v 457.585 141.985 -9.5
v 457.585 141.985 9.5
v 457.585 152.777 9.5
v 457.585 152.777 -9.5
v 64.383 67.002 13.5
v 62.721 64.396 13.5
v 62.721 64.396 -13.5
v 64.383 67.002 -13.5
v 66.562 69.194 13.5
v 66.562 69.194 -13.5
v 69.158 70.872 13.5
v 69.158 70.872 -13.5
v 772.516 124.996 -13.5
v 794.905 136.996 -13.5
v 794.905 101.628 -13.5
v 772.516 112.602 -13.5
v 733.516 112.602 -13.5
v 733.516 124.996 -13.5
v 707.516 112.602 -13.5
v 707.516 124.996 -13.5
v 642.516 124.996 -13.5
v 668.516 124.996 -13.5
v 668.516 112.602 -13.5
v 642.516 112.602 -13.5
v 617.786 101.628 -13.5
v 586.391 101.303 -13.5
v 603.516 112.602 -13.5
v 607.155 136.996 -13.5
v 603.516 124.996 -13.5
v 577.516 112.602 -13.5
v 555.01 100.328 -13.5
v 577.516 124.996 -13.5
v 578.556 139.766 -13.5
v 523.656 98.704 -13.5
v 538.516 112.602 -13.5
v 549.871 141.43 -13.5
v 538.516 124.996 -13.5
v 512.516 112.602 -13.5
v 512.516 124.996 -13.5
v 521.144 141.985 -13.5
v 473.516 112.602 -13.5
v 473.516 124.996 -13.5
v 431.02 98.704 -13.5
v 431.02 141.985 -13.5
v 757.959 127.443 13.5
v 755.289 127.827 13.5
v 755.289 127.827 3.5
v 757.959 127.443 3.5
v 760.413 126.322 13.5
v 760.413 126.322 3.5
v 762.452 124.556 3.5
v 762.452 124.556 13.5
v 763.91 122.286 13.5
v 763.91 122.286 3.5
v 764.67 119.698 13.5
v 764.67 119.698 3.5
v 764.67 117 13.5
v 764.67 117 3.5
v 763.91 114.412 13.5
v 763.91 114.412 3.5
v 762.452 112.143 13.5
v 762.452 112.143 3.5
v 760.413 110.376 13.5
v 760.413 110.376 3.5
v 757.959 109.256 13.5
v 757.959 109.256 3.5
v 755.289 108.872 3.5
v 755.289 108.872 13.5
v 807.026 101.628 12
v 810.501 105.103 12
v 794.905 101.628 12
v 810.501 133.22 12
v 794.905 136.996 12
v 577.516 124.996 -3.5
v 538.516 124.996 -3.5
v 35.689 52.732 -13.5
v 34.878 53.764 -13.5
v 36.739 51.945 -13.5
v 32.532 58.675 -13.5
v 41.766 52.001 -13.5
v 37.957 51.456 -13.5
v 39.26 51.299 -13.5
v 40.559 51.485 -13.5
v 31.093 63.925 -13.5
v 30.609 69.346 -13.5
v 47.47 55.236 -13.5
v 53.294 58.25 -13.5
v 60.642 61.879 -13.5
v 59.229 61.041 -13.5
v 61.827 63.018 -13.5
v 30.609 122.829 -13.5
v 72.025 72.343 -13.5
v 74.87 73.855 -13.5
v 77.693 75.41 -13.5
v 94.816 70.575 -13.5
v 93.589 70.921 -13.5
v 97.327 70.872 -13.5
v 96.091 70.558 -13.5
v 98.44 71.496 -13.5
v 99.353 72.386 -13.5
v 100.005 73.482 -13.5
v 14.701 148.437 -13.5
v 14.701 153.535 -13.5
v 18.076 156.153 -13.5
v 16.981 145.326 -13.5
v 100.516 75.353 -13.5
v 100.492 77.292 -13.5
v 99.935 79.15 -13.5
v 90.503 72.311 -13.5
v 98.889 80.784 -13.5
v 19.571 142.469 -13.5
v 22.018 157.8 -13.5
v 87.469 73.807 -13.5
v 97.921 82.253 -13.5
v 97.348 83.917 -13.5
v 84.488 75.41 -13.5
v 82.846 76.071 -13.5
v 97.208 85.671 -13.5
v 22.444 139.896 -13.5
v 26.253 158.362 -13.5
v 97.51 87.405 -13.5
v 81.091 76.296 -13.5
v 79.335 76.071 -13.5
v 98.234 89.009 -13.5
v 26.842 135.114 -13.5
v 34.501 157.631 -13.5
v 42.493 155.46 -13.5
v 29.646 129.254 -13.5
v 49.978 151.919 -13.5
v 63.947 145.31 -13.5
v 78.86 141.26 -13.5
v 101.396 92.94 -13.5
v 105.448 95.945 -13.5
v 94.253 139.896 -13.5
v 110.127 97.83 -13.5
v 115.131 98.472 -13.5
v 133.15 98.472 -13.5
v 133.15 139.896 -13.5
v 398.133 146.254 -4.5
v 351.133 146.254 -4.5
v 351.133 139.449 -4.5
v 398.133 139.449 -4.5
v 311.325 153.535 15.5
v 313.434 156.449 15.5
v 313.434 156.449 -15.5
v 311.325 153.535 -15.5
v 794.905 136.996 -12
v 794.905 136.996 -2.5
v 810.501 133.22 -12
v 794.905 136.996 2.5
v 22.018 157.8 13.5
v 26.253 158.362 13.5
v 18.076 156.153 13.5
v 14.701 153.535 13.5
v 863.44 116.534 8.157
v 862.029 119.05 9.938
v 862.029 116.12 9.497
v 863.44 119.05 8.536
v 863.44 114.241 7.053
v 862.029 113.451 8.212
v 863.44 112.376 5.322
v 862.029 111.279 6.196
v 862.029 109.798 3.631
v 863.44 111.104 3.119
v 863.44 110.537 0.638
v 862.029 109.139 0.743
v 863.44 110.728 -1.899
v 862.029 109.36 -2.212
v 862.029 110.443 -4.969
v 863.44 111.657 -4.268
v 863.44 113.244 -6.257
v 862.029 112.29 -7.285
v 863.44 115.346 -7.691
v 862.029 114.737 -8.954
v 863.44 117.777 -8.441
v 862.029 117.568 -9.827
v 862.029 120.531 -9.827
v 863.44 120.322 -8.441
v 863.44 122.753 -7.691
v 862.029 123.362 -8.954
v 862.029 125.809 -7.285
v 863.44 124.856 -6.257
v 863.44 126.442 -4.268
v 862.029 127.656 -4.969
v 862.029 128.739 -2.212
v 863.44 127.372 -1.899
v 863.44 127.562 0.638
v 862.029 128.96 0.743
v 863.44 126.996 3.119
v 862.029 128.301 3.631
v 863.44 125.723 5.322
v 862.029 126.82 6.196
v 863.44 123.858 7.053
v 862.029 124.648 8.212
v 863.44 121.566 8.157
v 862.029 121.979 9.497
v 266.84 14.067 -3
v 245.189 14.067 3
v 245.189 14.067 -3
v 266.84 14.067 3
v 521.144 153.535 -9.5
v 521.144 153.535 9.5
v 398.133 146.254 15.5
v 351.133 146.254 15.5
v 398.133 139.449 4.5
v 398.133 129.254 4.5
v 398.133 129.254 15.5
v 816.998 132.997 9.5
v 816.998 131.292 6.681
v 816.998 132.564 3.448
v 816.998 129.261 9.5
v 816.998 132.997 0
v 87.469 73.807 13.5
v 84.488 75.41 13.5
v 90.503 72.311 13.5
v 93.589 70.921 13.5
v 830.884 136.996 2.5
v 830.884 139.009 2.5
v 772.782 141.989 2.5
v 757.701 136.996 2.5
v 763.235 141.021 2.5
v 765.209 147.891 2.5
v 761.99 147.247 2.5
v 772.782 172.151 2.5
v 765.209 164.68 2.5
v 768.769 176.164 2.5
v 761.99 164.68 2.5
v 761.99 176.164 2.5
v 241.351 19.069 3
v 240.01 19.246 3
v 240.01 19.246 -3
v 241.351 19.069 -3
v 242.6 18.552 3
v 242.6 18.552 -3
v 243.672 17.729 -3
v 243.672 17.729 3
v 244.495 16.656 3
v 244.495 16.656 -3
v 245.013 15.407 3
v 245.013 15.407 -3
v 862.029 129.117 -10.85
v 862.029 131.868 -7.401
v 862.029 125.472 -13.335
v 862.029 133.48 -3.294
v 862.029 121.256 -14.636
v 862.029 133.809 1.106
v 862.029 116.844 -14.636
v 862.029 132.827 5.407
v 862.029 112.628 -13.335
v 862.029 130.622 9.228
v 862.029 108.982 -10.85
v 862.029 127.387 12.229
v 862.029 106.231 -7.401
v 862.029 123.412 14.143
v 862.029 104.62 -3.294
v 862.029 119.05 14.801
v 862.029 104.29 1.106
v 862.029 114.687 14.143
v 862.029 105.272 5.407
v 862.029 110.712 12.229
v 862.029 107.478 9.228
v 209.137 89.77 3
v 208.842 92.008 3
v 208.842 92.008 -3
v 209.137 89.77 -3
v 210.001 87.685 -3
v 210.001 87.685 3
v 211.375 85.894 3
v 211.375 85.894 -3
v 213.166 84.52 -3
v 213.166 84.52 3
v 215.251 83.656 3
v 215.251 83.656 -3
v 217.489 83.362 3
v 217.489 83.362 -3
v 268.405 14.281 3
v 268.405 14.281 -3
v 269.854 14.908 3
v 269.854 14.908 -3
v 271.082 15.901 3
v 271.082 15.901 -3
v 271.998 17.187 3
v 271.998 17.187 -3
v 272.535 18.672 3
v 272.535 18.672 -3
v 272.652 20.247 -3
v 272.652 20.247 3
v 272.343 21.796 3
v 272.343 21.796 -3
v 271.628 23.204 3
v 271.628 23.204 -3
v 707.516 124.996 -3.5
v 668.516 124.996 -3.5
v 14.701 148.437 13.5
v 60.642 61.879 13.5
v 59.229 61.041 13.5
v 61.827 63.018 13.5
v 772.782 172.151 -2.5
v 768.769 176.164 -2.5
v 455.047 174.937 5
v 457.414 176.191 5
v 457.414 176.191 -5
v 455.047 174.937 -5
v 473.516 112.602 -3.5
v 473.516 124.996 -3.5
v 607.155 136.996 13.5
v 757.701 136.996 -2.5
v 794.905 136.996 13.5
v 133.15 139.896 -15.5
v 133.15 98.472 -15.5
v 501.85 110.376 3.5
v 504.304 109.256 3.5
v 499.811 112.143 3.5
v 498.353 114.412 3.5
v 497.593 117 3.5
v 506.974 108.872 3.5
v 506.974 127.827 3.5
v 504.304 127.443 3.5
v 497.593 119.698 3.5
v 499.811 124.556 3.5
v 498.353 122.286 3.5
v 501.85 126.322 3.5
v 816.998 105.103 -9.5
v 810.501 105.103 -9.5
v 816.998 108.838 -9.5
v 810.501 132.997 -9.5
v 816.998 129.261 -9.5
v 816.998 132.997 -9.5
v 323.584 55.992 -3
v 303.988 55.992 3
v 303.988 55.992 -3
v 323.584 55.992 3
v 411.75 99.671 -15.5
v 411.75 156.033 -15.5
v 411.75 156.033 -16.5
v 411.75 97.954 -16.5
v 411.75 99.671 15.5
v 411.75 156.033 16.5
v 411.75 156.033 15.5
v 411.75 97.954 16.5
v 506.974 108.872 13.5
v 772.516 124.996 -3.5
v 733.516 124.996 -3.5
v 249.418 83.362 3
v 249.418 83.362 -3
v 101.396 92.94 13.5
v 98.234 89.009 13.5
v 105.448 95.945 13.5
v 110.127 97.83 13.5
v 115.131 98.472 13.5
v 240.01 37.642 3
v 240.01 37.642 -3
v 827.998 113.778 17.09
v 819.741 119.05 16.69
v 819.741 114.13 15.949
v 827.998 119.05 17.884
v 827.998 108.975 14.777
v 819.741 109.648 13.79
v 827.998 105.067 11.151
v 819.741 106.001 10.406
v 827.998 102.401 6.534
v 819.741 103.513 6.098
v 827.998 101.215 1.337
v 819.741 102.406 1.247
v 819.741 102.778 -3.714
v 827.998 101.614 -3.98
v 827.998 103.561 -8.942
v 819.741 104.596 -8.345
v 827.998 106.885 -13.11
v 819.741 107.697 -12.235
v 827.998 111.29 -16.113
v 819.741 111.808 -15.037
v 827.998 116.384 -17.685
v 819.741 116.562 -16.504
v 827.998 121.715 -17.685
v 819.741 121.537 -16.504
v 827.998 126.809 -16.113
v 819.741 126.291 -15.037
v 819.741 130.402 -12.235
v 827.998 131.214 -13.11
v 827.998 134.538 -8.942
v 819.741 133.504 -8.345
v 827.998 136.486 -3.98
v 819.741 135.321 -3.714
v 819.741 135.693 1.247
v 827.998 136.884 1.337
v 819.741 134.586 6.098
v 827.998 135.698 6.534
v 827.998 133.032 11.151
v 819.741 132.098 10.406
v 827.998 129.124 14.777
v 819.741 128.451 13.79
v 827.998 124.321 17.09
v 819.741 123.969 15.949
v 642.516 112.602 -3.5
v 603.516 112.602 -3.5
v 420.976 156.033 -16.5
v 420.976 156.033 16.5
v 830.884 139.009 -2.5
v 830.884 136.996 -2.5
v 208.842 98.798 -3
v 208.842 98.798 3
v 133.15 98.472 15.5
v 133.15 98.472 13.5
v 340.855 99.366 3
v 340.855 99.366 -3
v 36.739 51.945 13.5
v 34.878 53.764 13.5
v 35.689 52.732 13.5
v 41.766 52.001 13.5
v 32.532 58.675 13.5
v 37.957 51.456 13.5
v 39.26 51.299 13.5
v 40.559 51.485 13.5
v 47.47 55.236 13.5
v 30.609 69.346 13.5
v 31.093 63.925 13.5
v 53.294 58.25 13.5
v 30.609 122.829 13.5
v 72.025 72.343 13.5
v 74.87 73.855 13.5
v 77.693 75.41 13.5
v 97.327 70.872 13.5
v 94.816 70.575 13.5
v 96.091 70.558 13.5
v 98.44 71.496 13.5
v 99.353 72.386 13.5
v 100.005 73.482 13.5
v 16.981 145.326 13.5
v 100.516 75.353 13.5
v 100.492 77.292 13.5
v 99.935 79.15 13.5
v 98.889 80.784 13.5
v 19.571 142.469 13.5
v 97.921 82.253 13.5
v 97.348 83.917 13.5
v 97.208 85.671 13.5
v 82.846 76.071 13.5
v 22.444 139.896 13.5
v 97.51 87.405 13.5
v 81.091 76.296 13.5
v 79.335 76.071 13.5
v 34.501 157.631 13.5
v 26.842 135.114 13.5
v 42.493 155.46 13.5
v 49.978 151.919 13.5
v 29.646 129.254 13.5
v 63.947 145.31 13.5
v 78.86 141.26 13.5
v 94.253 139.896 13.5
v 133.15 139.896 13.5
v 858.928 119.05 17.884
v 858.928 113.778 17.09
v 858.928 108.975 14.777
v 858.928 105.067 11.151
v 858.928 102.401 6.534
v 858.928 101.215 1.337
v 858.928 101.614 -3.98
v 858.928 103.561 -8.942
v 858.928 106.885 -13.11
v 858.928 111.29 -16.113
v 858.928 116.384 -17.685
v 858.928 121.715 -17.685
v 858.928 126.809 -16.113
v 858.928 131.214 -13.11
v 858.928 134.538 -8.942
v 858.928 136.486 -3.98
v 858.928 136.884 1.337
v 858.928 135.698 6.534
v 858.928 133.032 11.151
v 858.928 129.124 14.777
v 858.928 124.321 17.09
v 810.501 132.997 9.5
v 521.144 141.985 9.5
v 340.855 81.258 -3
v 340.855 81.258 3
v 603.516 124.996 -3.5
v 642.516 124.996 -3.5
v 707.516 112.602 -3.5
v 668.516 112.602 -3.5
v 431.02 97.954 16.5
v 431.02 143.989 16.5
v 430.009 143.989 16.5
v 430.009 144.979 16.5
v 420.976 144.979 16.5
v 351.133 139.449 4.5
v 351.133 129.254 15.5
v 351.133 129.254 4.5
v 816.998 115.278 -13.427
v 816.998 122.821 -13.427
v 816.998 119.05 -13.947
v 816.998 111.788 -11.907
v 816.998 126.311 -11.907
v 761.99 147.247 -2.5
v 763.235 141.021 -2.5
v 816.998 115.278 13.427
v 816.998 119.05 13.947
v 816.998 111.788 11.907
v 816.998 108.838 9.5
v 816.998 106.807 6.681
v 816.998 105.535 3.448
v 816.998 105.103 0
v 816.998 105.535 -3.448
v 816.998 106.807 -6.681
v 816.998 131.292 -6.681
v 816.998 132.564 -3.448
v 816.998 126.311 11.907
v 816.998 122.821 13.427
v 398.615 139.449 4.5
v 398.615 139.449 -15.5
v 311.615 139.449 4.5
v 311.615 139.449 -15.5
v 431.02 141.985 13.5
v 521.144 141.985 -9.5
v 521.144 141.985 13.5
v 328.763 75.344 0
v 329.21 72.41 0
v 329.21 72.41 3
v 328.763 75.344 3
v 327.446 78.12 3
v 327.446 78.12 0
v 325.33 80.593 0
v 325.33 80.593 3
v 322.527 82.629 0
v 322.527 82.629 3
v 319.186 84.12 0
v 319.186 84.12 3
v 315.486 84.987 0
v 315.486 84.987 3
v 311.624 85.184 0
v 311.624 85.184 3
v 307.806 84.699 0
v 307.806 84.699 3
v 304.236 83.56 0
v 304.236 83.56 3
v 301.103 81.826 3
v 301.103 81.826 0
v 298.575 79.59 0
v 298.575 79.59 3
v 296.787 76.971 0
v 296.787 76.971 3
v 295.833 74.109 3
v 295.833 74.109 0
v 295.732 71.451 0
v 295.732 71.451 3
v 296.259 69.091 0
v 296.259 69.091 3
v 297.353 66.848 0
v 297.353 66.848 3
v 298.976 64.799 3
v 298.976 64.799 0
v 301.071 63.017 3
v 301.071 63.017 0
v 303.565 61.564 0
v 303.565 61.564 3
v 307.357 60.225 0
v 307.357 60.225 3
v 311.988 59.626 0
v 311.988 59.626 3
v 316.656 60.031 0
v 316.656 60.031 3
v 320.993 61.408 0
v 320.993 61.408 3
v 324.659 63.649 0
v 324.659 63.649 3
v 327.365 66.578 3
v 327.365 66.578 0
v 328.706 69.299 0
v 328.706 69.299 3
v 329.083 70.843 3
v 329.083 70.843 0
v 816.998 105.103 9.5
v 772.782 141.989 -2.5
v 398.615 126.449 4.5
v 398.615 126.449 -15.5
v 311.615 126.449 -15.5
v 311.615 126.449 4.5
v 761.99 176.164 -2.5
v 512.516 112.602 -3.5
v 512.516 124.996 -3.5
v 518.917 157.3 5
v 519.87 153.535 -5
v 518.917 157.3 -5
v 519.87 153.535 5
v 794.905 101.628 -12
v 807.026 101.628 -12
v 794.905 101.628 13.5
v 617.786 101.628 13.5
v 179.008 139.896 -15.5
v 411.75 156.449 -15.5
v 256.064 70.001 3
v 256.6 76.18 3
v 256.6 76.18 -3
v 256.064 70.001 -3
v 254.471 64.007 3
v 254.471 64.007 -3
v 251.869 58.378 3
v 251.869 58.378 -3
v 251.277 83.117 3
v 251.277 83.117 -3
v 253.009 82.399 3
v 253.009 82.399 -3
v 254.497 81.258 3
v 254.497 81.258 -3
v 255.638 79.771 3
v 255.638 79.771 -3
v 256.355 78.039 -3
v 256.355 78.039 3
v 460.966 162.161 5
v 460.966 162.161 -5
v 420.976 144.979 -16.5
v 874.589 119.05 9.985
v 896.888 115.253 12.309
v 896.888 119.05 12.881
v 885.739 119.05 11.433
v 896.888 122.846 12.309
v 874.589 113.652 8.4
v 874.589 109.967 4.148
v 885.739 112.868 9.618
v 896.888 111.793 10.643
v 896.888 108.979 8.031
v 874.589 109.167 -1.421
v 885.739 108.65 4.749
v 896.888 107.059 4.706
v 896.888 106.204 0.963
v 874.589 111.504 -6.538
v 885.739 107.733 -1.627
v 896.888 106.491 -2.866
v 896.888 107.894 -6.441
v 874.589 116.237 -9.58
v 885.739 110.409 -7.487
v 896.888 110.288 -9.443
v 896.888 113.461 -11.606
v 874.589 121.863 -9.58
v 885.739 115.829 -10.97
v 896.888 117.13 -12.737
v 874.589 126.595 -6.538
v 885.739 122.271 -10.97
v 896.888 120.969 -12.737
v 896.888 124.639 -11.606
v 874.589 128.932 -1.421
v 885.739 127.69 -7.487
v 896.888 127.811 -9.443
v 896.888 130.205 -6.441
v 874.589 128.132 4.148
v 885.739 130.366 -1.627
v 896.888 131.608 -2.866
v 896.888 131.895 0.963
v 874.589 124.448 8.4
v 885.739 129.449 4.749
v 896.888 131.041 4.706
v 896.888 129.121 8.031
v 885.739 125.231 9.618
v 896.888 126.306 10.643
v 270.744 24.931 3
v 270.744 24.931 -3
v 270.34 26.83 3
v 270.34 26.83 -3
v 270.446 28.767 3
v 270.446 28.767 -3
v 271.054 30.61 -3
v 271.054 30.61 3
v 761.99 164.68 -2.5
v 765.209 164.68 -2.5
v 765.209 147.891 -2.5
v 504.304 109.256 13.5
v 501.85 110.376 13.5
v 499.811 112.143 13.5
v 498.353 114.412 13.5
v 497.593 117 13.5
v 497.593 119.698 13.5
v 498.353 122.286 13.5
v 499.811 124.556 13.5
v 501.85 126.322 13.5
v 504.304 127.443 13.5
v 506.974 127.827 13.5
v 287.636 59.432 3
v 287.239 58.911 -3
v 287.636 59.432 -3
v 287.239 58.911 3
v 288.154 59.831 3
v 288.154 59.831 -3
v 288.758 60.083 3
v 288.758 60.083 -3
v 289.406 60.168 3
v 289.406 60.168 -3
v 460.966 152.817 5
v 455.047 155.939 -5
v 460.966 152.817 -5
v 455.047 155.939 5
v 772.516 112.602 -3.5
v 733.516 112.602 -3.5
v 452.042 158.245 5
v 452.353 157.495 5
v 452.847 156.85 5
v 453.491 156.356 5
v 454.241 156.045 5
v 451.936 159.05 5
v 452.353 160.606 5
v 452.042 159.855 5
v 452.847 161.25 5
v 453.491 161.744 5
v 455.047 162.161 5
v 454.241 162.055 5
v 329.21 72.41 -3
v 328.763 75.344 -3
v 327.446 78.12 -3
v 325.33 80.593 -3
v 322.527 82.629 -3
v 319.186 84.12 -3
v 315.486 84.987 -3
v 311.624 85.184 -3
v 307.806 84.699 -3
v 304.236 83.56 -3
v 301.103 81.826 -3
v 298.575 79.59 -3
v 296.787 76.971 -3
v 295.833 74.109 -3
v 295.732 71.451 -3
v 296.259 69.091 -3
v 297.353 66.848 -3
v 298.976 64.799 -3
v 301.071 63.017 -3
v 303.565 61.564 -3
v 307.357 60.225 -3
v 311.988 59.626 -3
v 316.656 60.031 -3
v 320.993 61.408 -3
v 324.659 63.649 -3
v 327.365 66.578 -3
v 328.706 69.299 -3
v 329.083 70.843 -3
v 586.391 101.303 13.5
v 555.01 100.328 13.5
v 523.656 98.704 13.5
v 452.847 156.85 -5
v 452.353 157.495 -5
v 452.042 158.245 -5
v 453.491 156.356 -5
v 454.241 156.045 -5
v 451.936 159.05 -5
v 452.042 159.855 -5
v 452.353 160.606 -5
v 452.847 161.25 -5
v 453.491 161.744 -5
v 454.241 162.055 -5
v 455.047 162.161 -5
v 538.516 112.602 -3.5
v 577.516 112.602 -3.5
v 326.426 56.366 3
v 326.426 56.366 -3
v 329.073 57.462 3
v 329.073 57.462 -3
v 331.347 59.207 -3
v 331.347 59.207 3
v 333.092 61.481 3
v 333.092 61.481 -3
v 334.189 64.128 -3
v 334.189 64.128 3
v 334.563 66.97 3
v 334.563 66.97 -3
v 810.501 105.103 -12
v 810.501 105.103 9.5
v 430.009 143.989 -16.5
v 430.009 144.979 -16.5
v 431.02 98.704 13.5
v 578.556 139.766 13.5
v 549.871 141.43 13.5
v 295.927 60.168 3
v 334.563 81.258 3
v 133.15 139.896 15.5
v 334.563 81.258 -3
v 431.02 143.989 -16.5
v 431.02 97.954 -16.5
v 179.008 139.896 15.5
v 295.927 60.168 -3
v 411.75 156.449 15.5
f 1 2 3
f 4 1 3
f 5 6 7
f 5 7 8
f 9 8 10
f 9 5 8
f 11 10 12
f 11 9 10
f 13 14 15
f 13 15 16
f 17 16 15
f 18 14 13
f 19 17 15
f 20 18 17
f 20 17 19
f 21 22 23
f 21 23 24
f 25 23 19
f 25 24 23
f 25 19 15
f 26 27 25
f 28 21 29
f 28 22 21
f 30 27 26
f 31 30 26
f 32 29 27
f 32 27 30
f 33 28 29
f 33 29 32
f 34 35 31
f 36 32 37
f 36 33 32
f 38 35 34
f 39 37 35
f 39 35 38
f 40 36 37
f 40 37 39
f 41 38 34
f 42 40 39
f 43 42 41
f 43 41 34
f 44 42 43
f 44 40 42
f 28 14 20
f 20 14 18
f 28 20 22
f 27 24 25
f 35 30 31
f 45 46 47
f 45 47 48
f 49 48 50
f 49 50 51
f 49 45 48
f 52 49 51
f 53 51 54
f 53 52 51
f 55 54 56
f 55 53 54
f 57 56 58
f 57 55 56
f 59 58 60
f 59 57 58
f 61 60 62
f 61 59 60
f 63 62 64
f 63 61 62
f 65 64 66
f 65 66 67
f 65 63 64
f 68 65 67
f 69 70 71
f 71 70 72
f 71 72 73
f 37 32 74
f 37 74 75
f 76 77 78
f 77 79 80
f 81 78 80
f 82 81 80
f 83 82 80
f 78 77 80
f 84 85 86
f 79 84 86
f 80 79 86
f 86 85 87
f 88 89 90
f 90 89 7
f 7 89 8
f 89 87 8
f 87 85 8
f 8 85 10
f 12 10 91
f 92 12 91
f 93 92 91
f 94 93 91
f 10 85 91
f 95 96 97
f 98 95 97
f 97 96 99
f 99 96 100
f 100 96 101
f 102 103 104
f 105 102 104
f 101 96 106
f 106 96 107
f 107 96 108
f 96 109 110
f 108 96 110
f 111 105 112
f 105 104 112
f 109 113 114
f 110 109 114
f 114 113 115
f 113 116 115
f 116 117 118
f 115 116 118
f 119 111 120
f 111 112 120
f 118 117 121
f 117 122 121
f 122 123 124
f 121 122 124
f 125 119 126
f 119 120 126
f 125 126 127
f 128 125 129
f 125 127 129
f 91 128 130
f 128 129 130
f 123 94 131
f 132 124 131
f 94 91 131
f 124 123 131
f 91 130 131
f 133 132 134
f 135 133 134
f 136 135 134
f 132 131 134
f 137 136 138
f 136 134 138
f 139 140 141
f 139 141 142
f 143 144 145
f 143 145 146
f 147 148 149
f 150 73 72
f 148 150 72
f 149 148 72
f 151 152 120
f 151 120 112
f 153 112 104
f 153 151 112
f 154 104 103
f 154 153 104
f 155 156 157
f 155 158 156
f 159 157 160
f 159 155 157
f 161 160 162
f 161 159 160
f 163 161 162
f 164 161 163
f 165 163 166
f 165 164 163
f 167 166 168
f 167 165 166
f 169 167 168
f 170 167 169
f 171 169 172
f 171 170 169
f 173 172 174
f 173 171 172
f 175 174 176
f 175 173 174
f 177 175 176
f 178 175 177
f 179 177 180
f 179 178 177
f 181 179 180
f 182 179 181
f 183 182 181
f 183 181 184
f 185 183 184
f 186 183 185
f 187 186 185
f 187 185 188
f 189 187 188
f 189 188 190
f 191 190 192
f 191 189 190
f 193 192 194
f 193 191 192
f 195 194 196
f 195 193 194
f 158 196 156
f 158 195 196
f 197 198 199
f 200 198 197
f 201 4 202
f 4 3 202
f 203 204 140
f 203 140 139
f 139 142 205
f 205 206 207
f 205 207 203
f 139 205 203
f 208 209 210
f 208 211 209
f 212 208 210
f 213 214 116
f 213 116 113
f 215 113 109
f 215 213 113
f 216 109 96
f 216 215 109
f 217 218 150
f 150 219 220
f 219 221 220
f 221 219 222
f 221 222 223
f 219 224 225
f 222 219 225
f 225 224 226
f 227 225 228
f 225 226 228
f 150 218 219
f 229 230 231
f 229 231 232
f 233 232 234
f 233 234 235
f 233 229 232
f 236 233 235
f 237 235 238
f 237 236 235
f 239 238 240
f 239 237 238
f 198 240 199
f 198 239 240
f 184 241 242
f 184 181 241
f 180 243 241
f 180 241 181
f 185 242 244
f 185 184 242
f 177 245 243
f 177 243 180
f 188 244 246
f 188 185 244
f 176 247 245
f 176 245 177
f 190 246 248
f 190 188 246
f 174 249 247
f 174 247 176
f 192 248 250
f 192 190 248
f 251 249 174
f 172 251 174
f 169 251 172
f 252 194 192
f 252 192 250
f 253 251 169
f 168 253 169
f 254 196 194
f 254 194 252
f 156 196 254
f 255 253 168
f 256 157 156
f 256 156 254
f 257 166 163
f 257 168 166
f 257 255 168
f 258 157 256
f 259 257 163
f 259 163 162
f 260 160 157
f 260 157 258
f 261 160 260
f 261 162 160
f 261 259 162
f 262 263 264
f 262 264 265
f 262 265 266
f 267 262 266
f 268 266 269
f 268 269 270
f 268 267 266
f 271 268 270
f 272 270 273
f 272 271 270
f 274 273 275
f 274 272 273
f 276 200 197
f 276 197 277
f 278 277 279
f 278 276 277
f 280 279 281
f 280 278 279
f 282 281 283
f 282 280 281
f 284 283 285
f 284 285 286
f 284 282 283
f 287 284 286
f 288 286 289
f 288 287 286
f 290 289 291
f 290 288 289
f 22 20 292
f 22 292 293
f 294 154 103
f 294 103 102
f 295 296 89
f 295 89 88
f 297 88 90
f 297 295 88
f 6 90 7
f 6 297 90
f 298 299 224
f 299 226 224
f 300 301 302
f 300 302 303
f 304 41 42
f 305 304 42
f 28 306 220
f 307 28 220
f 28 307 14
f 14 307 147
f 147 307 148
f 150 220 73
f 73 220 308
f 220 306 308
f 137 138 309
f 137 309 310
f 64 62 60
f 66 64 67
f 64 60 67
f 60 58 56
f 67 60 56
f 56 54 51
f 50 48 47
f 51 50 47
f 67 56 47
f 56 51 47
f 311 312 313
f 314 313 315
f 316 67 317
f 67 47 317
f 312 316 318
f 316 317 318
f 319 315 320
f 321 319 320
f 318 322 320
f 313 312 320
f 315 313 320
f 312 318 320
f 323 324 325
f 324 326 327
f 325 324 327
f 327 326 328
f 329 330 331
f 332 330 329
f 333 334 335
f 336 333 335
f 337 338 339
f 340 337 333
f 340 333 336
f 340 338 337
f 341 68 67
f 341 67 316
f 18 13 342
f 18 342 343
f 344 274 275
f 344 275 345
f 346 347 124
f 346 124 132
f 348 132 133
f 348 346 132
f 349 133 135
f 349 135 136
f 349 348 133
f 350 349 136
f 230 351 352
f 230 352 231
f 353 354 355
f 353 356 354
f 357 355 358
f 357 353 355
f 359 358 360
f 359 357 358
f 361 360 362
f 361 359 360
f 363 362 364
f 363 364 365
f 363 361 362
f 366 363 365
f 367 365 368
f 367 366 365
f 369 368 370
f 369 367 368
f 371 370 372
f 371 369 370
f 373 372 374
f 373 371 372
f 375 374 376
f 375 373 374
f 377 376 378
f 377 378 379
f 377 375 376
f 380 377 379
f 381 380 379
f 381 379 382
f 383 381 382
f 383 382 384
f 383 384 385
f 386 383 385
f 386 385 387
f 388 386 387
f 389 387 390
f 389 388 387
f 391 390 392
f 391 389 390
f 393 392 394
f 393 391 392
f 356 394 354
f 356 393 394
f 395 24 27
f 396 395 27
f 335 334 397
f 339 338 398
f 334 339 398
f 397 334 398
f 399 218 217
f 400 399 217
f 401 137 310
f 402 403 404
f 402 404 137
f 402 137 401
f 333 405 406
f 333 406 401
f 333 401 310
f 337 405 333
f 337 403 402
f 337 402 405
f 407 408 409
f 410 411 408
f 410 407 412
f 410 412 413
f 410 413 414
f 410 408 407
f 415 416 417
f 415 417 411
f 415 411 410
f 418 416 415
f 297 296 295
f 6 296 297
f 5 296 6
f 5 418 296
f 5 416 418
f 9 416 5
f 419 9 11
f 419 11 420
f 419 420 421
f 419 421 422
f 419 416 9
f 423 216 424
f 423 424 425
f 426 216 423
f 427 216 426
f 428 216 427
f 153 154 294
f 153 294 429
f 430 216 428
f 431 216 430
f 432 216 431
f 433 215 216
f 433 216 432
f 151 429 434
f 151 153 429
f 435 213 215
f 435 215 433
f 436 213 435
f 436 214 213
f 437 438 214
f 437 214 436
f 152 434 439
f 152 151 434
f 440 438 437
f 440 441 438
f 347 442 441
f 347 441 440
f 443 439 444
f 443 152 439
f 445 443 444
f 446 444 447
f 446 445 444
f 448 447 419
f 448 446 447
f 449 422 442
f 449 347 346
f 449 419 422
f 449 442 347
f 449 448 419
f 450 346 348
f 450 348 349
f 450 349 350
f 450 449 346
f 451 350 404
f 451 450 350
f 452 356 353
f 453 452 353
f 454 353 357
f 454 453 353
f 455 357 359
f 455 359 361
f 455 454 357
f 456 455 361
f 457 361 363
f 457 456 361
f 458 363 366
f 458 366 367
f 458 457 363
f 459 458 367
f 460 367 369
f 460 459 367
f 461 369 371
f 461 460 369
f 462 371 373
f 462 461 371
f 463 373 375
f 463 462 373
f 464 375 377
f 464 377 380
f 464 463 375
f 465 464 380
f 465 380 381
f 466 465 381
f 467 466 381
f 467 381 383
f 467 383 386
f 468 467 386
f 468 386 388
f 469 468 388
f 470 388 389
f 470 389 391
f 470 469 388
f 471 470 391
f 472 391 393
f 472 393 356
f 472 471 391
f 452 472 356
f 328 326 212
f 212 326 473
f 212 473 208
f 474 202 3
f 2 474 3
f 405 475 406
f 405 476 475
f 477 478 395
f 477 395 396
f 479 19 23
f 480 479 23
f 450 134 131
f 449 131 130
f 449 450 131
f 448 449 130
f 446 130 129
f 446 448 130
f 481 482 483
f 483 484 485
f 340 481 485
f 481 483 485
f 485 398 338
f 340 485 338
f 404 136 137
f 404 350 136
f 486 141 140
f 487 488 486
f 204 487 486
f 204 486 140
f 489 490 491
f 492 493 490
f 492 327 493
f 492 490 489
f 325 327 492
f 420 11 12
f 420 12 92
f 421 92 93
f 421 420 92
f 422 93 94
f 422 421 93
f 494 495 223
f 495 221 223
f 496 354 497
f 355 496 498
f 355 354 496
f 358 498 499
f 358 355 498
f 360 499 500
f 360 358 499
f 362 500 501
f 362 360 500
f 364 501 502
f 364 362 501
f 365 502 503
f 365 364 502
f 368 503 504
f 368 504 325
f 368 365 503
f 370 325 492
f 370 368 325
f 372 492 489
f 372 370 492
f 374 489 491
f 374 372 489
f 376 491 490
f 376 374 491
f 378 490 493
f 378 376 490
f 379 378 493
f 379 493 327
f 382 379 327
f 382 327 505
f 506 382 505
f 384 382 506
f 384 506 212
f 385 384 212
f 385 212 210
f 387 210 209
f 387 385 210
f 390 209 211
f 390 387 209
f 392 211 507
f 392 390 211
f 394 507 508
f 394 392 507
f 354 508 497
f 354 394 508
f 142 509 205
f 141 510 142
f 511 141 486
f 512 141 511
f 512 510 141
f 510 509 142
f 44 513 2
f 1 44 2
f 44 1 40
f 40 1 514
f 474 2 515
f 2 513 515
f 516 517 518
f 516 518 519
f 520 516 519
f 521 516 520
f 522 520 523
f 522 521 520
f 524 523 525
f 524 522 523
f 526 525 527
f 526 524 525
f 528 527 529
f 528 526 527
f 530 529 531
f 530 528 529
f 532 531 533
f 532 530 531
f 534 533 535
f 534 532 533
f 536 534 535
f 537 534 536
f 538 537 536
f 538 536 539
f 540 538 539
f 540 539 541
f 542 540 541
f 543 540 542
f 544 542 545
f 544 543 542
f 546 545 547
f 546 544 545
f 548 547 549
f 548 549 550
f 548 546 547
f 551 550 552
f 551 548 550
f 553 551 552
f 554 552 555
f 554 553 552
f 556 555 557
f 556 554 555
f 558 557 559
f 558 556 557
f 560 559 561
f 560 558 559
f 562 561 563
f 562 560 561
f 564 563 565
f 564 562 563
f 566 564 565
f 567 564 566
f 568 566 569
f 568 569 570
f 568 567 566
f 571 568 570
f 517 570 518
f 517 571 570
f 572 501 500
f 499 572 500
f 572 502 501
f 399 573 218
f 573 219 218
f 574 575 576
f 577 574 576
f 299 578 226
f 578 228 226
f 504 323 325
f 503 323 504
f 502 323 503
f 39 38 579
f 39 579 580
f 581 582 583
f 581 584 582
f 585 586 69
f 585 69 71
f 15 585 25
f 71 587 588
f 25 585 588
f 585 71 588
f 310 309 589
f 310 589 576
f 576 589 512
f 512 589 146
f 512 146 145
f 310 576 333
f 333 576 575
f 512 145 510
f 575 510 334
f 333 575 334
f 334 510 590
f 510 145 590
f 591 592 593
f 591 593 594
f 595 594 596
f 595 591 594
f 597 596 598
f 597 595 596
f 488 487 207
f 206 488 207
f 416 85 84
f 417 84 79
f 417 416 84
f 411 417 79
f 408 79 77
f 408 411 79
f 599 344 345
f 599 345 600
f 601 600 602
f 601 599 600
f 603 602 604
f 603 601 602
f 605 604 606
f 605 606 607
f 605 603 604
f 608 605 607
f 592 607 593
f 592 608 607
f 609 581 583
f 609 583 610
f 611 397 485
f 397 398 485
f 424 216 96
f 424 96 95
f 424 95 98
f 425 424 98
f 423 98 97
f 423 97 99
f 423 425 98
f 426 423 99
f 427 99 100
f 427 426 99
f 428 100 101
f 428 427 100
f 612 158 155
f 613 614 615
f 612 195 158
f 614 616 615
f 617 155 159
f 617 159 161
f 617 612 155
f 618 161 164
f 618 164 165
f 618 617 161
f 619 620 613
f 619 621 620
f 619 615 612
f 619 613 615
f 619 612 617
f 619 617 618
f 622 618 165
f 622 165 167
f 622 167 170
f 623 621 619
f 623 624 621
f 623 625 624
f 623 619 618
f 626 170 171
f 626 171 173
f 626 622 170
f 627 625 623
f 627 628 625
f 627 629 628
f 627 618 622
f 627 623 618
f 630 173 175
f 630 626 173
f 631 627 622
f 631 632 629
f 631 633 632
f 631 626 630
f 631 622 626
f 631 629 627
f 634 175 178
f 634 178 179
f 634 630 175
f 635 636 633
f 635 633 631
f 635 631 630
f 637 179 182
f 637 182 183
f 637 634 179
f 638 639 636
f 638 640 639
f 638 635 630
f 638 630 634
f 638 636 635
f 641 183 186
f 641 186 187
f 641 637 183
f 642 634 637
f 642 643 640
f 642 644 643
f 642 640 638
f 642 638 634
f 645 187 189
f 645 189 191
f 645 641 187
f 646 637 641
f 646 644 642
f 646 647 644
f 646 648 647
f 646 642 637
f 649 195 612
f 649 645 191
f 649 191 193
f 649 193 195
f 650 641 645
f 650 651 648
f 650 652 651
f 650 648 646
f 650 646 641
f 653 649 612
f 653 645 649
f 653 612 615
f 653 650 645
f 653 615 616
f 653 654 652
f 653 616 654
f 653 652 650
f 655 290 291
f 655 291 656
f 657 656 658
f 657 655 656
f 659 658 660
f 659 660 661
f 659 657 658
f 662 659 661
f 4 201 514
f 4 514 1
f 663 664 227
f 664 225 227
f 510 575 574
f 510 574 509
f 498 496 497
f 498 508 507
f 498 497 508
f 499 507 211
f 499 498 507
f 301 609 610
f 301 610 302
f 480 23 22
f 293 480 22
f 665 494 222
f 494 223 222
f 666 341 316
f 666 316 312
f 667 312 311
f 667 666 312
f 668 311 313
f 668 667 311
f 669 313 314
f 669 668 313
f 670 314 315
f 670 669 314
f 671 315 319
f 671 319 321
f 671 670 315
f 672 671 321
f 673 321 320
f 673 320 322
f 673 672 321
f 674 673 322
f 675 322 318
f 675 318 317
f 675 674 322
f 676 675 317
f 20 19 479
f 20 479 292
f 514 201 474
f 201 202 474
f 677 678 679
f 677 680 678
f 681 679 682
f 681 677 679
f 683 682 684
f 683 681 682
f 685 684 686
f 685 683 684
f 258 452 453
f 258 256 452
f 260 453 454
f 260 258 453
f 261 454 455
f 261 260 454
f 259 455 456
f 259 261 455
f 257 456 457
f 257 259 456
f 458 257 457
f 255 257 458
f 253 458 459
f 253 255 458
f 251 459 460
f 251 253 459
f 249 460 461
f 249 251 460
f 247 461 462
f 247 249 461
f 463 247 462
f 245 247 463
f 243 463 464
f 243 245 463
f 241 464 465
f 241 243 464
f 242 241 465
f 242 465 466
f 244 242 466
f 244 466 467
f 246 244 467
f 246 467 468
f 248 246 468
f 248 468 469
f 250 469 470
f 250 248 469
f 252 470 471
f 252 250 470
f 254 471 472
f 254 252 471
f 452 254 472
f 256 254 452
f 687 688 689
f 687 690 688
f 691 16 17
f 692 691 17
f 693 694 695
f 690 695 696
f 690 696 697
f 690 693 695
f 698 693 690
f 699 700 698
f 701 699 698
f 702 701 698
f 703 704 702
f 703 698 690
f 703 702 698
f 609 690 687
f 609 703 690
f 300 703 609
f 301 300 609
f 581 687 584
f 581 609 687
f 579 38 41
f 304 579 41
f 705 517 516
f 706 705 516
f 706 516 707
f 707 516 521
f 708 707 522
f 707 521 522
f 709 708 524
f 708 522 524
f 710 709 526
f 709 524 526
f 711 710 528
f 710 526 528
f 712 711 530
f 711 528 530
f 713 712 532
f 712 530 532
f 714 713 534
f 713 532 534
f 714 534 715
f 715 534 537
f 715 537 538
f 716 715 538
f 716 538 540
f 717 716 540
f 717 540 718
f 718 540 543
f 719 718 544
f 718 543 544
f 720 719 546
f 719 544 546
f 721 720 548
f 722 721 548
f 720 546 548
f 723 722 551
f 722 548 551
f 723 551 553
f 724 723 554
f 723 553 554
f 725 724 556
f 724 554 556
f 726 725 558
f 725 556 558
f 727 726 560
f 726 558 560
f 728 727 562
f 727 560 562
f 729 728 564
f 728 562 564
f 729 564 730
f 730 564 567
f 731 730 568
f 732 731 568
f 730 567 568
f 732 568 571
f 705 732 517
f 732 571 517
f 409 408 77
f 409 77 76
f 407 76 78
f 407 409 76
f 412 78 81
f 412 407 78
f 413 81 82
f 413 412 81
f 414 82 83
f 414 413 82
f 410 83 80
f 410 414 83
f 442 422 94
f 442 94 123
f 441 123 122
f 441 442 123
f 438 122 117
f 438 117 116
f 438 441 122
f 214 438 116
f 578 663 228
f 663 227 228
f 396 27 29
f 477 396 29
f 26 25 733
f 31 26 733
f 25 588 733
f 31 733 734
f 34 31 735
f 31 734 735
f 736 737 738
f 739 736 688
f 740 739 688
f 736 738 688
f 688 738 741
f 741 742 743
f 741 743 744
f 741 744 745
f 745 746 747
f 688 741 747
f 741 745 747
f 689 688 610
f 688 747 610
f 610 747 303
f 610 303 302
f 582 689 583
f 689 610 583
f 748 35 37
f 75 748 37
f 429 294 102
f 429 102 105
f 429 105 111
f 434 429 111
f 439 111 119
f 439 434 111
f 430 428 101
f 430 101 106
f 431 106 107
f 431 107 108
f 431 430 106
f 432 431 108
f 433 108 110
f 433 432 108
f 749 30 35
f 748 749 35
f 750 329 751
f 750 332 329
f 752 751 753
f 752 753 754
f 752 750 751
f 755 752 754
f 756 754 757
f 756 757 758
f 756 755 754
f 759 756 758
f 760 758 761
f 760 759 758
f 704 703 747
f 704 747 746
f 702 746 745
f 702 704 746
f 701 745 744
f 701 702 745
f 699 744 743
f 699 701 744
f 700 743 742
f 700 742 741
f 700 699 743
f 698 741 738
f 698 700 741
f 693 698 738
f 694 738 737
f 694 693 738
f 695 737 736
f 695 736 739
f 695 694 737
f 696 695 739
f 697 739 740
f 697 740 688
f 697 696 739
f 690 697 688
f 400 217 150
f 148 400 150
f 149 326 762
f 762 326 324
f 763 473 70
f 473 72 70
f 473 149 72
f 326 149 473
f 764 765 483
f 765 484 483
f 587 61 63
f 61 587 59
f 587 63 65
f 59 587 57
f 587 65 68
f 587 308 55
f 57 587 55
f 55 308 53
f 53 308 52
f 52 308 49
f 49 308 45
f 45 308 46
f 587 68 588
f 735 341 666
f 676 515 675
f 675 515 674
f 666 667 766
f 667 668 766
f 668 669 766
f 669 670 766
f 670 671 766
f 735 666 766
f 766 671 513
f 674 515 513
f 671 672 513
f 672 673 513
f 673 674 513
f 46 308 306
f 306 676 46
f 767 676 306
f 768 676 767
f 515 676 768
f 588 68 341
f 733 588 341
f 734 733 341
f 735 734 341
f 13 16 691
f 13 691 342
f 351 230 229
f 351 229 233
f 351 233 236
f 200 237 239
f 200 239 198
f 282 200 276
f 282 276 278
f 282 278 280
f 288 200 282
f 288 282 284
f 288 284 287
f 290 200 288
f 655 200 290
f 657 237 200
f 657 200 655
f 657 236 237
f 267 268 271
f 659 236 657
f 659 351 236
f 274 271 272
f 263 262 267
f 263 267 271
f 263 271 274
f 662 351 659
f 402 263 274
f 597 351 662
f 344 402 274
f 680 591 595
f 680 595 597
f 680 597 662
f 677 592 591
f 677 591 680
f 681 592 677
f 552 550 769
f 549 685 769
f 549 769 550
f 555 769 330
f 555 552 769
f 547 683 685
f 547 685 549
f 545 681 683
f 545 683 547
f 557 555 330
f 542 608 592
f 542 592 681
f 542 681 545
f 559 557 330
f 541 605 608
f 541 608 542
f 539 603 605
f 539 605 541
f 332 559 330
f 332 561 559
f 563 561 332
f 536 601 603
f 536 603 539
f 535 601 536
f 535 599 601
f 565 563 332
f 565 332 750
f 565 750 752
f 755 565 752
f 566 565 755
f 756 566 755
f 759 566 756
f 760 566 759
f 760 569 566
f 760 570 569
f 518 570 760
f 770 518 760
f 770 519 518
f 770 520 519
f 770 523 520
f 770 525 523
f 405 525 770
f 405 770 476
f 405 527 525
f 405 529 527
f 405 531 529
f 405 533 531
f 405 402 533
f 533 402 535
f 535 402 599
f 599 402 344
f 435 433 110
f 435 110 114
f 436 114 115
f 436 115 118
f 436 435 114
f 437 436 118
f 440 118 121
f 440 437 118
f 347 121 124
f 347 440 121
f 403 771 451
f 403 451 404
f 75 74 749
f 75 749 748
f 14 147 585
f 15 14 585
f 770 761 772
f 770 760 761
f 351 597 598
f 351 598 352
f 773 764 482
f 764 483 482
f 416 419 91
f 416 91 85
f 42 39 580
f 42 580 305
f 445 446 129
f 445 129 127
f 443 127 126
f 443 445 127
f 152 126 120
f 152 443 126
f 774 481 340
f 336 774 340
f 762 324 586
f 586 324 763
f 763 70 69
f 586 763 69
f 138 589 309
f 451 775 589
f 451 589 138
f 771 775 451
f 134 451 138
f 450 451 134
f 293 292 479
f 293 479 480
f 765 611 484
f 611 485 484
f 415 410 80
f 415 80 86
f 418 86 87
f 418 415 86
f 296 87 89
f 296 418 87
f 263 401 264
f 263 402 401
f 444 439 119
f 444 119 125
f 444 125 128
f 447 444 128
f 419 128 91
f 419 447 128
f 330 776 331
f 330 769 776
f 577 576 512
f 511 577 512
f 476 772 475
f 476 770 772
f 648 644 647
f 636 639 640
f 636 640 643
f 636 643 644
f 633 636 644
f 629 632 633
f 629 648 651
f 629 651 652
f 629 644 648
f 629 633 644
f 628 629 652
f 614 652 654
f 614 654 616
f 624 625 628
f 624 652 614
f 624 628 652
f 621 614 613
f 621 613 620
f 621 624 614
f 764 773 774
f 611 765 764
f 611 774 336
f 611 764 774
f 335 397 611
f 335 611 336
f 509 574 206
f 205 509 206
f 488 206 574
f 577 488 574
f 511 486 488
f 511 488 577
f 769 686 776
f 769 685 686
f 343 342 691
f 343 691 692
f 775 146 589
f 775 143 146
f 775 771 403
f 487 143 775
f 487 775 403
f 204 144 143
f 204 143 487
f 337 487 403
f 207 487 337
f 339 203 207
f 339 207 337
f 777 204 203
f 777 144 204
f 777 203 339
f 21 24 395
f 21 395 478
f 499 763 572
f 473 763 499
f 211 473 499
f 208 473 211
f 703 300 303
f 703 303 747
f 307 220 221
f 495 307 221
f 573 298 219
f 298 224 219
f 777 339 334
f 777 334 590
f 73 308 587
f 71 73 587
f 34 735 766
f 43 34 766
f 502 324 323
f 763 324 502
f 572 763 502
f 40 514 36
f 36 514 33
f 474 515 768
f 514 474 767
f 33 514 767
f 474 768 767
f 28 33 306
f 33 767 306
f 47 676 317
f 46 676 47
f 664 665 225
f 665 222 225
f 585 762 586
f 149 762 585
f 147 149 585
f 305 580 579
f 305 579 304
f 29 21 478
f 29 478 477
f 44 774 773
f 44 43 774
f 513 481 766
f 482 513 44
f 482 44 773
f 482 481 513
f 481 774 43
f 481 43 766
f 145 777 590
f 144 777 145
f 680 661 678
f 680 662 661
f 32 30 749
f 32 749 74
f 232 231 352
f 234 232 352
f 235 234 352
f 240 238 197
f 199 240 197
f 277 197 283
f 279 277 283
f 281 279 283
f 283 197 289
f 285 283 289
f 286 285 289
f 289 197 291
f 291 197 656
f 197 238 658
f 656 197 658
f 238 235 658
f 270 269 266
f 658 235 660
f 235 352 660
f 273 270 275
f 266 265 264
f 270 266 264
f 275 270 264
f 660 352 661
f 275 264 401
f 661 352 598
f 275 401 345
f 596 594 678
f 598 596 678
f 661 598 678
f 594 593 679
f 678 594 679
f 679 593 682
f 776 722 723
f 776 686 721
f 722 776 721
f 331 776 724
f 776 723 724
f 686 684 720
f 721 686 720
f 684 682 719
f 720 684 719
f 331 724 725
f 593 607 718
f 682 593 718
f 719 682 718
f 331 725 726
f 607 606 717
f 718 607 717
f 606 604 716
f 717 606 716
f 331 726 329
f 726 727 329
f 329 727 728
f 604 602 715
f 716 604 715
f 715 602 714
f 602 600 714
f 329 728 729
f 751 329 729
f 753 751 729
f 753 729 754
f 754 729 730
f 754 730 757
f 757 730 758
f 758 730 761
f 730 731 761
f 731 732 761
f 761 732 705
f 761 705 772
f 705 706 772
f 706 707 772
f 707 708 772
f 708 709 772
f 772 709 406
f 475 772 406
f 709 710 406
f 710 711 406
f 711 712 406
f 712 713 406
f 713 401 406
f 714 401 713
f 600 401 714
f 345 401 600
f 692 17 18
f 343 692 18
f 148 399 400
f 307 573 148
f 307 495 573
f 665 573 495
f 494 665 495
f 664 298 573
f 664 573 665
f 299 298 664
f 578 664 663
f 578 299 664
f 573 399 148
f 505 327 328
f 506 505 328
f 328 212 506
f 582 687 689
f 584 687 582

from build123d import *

# Parameters (mm, degrees)
BOSS_EXTRUDE1_DEPTH  = 15.5
BOSS_EXTRUDE2_DEPTH  = 16.5
BOSS_EXTRUDE3_DEPTH  = 13.5
BOSS_EXTRUDE4_DEPTH  = 13.5
BOSS_EXTRUDE5_DEPTH  = 12
SKETCH8_W            = 6.496390684
SKETCH8_H            = 27.893944802
BOSS_EXTRUDE6_DEPTH  = 9.5
BOSS_EXTRUDE7_DEPTH  = 9.5
BOSS_EXTRUDE8_DEPTH  = 5
BOSS_EXTRUDE9_DEPTH  = 2.5
SKETCH12_RX          = 16.762384294
SKETCH12_RY          = 12.789078387
BOSS_EXTRUDE10_DEPTH = 3
CUT_EXTRUDE1_DEPTH   = 10
SKETCH15_W           = 39
SKETCH15_H           = 12.394538065
CUT_EXTRUDE2_DEPTH   = 10
LPATTERN1_COUNT      = 5
LPATTERN1_PITCH      = 65
SKETCH16_W           = 87
SKETCH16_H           = 13
CUT_EXTRUDE3_DEPTH   = 20
SKETCH17_W           = 47
SKETCH17_H           = 17
CUT_EXTRUDE4_DEPTH   = 20


with BuildPart() as part:
    # Sketch3 → Boss-Extrude1 (new, symmetric)
    with BuildSketch(Plane.XY):
        Polygon((133.149858051, 139.895661973), (133.149858051, 98.471820279), (411.749827309, 99.670984239), (411.749827309, 156.44910347), (313.434031377, 156.44910347), (311.324996959, 153.534720699), (179.007614185, 139.895661973), align=None)
    extrude(amount=BOSS_EXTRUDE1_DEPTH, both=True)

    # Sketch4 → Boss-Extrude2 (add, symmetric)
    with BuildSketch(Plane.XY):
        Polygon((411.749827309, 156.033029169), (420.975775825, 156.033029169), (420.975775825, 144.978532204), (430.009114764, 144.978532204), (430.009114764, 143.988577252), (431.019693777, 143.988577252), (431.019693777, 141.994324915), (431.019693777, 97.953675999), (411.749827309, 97.953675999), (411.749827309, 99.670984239), align=None)
    extrude(amount=BOSS_EXTRUDE2_DEPTH, both=True)

    # Sketch5 → Boss-Extrude3 (add, symmetric)
    with BuildSketch(Plane.XY):
        with BuildLine():
            Line((133.149858051, 139.895661973), (94.252855504, 139.895661973))
            ThreePointArc((94.252855504, 139.895661973), (71.313845446, 142.954897437), (49.978282681, 151.918761872))
            ThreePointArc((49.978282681, 151.918761872), (38.545088727, 156.722272414), (26.252647511, 158.361640112))
            ThreePointArc((26.252647511, 158.361640112), (19.992753467, 157.106388363), (14.700767025, 153.534720699))
            Line((14.700767025, 153.534720699), (14.700767025, 148.437439097))
            ThreePointArc((14.700767025, 148.437439097), (18.238668479, 143.863918039), (22.444234475, 139.895661973))
            ThreePointArc((22.444234475, 139.895661973), (28.462546977, 132.28862519), (30.608744585, 122.82918917))
            Line((30.608744585, 122.82918917), (30.608744585, 69.346080174))
            ThreePointArc((30.608744585, 69.346080174), (31.695406767, 61.267845658), (34.878139046, 53.763918499))
            ThreePointArc((34.878139046, 53.763918499), (37.956933722, 51.456084346), (41.765855495, 52.001235761))
            ThreePointArc((41.765855495, 52.001235761), (50.367903613, 56.770738529), (59.228520707, 61.040733047))
            ThreePointArc((59.228520707, 61.040733047), (61.267048723, 62.414327993), (62.721053749, 64.396304009))
            ThreePointArc((62.721053749, 64.396304009), (65.413891541, 68.156904958), (69.158209867, 70.872337731))
            ThreePointArc((69.158209867, 70.872337731), (73.450700222, 73.093711085), (77.692994463, 75.409507404))
            ThreePointArc((77.692994463, 75.409507404), (81.090516464, 76.296497825), (84.488038465, 75.409507404))
            ThreePointArc((84.488038465, 75.409507404), (88.979339547, 73.045671959), (93.588552357, 70.920898865))
            ThreePointArc((93.588552357, 70.920898865), (97.327152104, 70.872337731), (100.005079243, 73.481589057))
            ThreePointArc((100.005079243, 73.481589057), (100.491809305, 77.292238781), (98.889475004, 80.783725895))
            ThreePointArc((98.889475004, 80.783725895), (97.223033107, 84.789475542), (98.233640809, 89.00868529))
            ThreePointArc((98.233640809, 89.00868529), (105.447578681, 95.944937223), (115.130933085, 98.471820279))
            Line((115.130933085, 98.471820279), (133.149858051, 98.471820279))
            Line((133.149858051, 98.471820279), (133.149858051, 139.895661973))
        make_face()
    extrude(amount=BOSS_EXTRUDE3_DEPTH, both=True)

    # Sketch6 → Boss-Extrude4 (add, symmetric)
    with BuildSketch(Plane.XY):
        with BuildLine():
            Line((431.019693777, 141.985108027), (521.143927742, 141.985108027))
            ThreePointArc((521.143927742, 141.985108027), (564.221550984, 140.736824542), (607.154606888, 136.996163292))
            Line((607.154606888, 136.996163292), (794.904816514, 136.996163292))
            Line((794.904816514, 136.996163292), (794.904816514, 101.627825911))
            Line((794.904816514, 101.627825911), (617.7858187, 101.627825911))
            ThreePointArc((617.7858187, 101.627825911), (570.698310194, 100.896770347), (523.656190664, 98.704308341))
            Line((523.656190664, 98.704308341), (431.019693777, 98.704308341))
            Line((431.019693777, 98.704308341), (431.019693777, 141.985108027))
        make_face()
    extrude(amount=BOSS_EXTRUDE4_DEPTH, both=True)

    # Sketch7 → Boss-Extrude5 (add, symmetric)
    with BuildSketch(Plane.XY):
        Polygon((794.904816514, 136.996163292), (810.501213197, 133.220193001), (810.501213197, 105.102603394), (807.026435715, 101.627825911), (794.904816514, 101.627825911), align=None)
    extrude(amount=BOSS_EXTRUDE5_DEPTH, both=True)

    # Sketch8 → Boss-Extrude6 (add, symmetric)
    with BuildSketch(Plane.XY):
        with Locations((813.749408539, 119.049575795)):
            Rectangle(SKETCH8_W, SKETCH8_H)
    extrude(amount=BOSS_EXTRUDE6_DEPTH, both=True)

    # Sketch9 → Boss-Extrude7 (add, symmetric)
    with BuildSketch(Plane.XY):
        Polygon((457.584707407, 141.985108027), (457.584707407, 152.776573918), (521.143927742, 153.534720699), (521.143927742, 141.985108027), align=None)
    extrude(amount=BOSS_EXTRUDE7_DEPTH, both=True)

    # Sketch11 → Boss-Extrude9 (add, symmetric)
    with BuildSketch(Plane.XY):
        Polygon((757.700729864, 136.996163292), (763.234993942, 141.020978106), (761.989784524, 147.247025193), (765.209236223, 147.890915533), (765.209236223, 164.679957037), (761.989784524, 164.679957037), (761.989784524, 176.163554998), (768.769258019, 176.163554998), (772.781599476, 172.151213542), (772.781599476, 141.989474319), (830.884412859, 139.008570699), (830.884412859, 136.996163292), align=None)
    extrude(amount=BOSS_EXTRUDE9_DEPTH, both=True)

    # Sketch12 → Boss-Extrude10 (add, symmetric)
    with BuildSketch(Plane.XY):
        with BuildLine():
            Line((208.842158386, 98.797618874), (208.842158386, 92.008322654))
            ThreePointArc((208.842158386, 92.008322654), (211.374734093, 85.894144033), (217.488912713, 83.361568326))
            Line((217.488912713, 83.361568326), (249.418367521, 83.361568326))
            ThreePointArc((249.418367521, 83.361568326), (254.496678976, 81.258062848), (256.600184454, 76.179751393))
            ThreePointArc((256.600184454, 76.179751393), (255.397255812, 66.969790939), (251.869178098, 58.377755294))
            Line((251.869178098, 58.377755294), (240.010170569, 37.641818809))
            Line((240.010170569, 37.641818809), (240.010170569, 19.245849473))
            ThreePointArc((240.010170569, 19.245849473), (243.672242968, 17.72896942), (245.189123022, 14.066897021))
            Line((245.189123022, 14.066897021), (266.840112738, 14.066897021))
            ThreePointArc((266.840112738, 14.066897021), (271.998110462, 17.187212495), (271.628495834, 23.204246166))
            ThreePointArc((271.628495834, 23.204246166), (270.340295157, 26.829606572), (271.053889863, 30.610278688))
            Line((271.053889863, 30.610278688), (287.239486775, 58.9114252))
            ThreePointArc((287.239486775, 58.9114252), (288.153804085, 59.831372974), (289.4062922, 60.168350083))
            Line((289.4062922, 60.168350083), (295.92740565, 60.168350083))
            Line((295.92740565, 60.168350083), (303.987895413, 55.99154739))
            Line((303.987895413, 55.99154739), (323.584374238, 55.99154739))
            ThreePointArc((323.584374238, 55.99154739), (331.347164696, 59.20700048), (334.562617786, 66.969790939))
            Line((334.562617786, 66.969790939), (334.562617786, 81.258062848))
            Line((334.562617786, 81.258062848), (340.855180353, 81.258062848))
            Line((340.855180353, 81.258062848), (340.855180353, 99.365835944))
            Line((340.855180353, 99.365835944), (208.842158386, 98.797618874))
        make_face()
        with Locations((312.447304179, 72.410281153)):
            Ellipse(SKETCH12_RX, SKETCH12_RY, mode=Mode.SUBTRACT)
    extrude(amount=BOSS_EXTRUDE10_DEPTH, both=True)

    # Sketch13 → Revolve21 (revolve)
    with BuildSketch(Plane.XY, mode=Mode.PRIVATE) as revolve21_sk:
        Polygon((816.997603881, 119.049575795), (816.997603881, 132.996548196), (819.740656944, 135.739601259), (827.99767889, 136.934043607), (858.927588214, 136.934043607), (862.029347768, 133.850634066), (862.029347768, 128.987987545), (863.440032351, 127.585648574), (896.888326318, 131.930945848), (896.888326318, 119.049575795), align=None)
    revolve(revolve21_sk.sketch.rotate(Axis((816.997603881, 119.049575795, 0), (1, 0, 0)), 90), axis=Axis((816.997603881, 119.049575795, 0), (1, 0, 0)))

    # Sketch14 → Cut-Extrude1 (cut)
    with BuildSketch(Plane.XY.offset(13.5)):
        with BuildLine():
            Line((506.973990238, 127.826963558), (755.289068279, 127.826963558))
            ThreePointArc((755.289068279, 127.826963558), (764.766743013, 118.349288824), (755.289068279, 108.87161409))
            Line((755.289068279, 108.87161409), (506.973990238, 108.87161409))
            ThreePointArc((506.973990238, 108.87161409), (497.496315503, 118.349288824), (506.973990238, 127.826963558))
        make_face()
    extrude(amount=-CUT_EXTRUDE1_DEPTH, mode=Mode.SUBTRACT)

    # Sketch15 → Cut-Extrude2 (cut)
    with BuildSketch(Plane(origin=(0, 0, -13.5), x_dir=(-1, 0, 0), z_dir=(0, 0, -1))):
        with Locations((-753.015574956, 118.79889426)):
            Rectangle(SKETCH15_W, SKETCH15_H)
    cut_extrude2 = extrude(amount=-CUT_EXTRUDE2_DEPTH, mode=Mode.SUBTRACT)

    # LPattern1: Cut-Extrude2 ×5
    with Locations(*[(-i * LPATTERN1_PITCH, 0, 0) for i in range(1, LPATTERN1_COUNT)]):
        add(cut_extrude2, mode=Mode.SUBTRACT)

    # Sketch16 → Cut-Extrude3 (cut)
    with BuildSketch(Plane(origin=(0, 0, -15.5), x_dir=(-1, 0, 0), z_dir=(0, 0, -1))):
        with Locations((-355.115432636, 132.94910347)):
            Rectangle(SKETCH16_W, SKETCH16_H)
    extrude(amount=-CUT_EXTRUDE3_DEPTH, mode=Mode.SUBTRACT)

    # Sketch17 → Cut-Extrude4 (cut)
    with BuildSketch(Plane.XY.offset(15.5)):
        with Locations((374.633368208, 137.754171164)):
            Rectangle(SKETCH17_W, SKETCH17_H)
    extrude(amount=-CUT_EXTRUDE4_DEPTH, mode=Mode.SUBTRACT)


with BuildPart() as body_2:
    # Sketch10 → Boss-Extrude8 (new, symmetric)
    with BuildSketch(Plane.XY):
        with BuildLine():
            Line((519.869775561, 153.534720699), (518.91663693, 157.299936474))
            Line((518.91663693, 157.299936474), (460.96580818, 162.160943491))
            Line((460.96580818, 162.160943491), (457.414176457, 176.191074428))
            Line((457.414176457, 176.191074428), (455.046590192, 174.936861902))
            Line((455.046590192, 174.936861902), (455.046590192, 162.160943491))
            ThreePointArc((455.046590192, 162.160943491), (452.846921386, 161.249810839), (451.935788734, 159.050142033))
            ThreePointArc((451.935788734, 159.050142033), (452.846921386, 156.850473227), (455.046590192, 155.939340575))
            Line((455.046590192, 155.939340575), (460.96580818, 152.816904347))
            Line((460.96580818, 152.816904347), (519.869775561, 153.534720699))
        make_face()
    extrude(amount=BOSS_EXTRUDE8_DEPTH, both=True)


solid = Compound([part.part, body_2.part])
